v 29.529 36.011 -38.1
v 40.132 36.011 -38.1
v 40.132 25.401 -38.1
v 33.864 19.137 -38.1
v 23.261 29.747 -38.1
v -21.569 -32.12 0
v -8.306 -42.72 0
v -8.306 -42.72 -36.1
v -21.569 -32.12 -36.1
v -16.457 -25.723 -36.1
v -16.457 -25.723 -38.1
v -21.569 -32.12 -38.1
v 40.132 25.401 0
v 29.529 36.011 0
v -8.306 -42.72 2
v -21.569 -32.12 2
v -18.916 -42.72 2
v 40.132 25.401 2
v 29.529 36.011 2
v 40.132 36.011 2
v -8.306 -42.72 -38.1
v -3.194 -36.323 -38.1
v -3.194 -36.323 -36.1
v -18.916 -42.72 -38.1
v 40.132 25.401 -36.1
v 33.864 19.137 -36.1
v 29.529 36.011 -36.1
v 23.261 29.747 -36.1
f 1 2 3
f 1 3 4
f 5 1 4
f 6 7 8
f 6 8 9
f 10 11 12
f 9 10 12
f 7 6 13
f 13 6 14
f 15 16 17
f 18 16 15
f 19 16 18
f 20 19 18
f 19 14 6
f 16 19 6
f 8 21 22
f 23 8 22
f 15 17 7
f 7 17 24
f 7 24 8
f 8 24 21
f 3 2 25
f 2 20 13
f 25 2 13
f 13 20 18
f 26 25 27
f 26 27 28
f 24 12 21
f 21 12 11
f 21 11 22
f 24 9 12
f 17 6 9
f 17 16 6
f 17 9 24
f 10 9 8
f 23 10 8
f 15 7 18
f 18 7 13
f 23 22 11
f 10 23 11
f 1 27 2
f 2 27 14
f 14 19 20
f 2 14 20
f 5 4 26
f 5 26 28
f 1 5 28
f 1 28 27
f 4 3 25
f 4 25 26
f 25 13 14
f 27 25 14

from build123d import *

# Parameters (mm, degrees)
BOSS_EXTRUDE1_DEPTH = 2
BOSS_EXTRUDE2_DEPTH = 38.1
BOSS_EXTRUDE3_DEPTH = 2


with BuildPart() as part:
    # Sketch1 → Boss-Extrude1 (new body)
    with BuildSketch(Plane.XY):
        Polygon((29.528587169, 36.011013454), (-21.569396066, -32.119630858), (-18.916193719, -42.719630858), (-8.306193719, -42.719630858), (40.131789515, 25.401013454), (40.131789515, 36.011013454), align=None)
    extrude(amount=BOSS_EXTRUDE1_DEPTH)

    # Sketch2 → Boss-Extrude2 (add)
    with BuildSketch(Plane(origin=(0, 0, 0), x_dir=(-1, 0, 0), z_dir=(0, 0, -1))):
        Polygon((-40.131789515, 25.401013454), (-29.528587169, 36.011013454), (-40.131789515, 36.011013454), align=None)
        Polygon((8.306193719, -42.719630858), (21.569396066, -32.119630858), (18.916193719, -42.719630858), align=None)
    extrude(amount=BOSS_EXTRUDE2_DEPTH)

    # Sketch3 → Boss-Extrude3 (add)
    with BuildSketch(Plane(origin=(0, 0, -38.1), x_dir=(-1, 0, 0), z_dir=(0, 0, -1))):
        Polygon((21.569396066, -32.119630858), (8.306193719, -42.719630858), (3.194123868, -36.323176439), (16.457326214, -25.723176439), align=None)
        Polygon((-29.528587169, 36.011013454), (-40.131789515, 25.401013454), (-33.863813996, 19.137053724), (-23.260611649, 29.747053724), align=None)
    extrude(amount=-BOSS_EXTRUDE3_DEPTH)


solid = part.part
